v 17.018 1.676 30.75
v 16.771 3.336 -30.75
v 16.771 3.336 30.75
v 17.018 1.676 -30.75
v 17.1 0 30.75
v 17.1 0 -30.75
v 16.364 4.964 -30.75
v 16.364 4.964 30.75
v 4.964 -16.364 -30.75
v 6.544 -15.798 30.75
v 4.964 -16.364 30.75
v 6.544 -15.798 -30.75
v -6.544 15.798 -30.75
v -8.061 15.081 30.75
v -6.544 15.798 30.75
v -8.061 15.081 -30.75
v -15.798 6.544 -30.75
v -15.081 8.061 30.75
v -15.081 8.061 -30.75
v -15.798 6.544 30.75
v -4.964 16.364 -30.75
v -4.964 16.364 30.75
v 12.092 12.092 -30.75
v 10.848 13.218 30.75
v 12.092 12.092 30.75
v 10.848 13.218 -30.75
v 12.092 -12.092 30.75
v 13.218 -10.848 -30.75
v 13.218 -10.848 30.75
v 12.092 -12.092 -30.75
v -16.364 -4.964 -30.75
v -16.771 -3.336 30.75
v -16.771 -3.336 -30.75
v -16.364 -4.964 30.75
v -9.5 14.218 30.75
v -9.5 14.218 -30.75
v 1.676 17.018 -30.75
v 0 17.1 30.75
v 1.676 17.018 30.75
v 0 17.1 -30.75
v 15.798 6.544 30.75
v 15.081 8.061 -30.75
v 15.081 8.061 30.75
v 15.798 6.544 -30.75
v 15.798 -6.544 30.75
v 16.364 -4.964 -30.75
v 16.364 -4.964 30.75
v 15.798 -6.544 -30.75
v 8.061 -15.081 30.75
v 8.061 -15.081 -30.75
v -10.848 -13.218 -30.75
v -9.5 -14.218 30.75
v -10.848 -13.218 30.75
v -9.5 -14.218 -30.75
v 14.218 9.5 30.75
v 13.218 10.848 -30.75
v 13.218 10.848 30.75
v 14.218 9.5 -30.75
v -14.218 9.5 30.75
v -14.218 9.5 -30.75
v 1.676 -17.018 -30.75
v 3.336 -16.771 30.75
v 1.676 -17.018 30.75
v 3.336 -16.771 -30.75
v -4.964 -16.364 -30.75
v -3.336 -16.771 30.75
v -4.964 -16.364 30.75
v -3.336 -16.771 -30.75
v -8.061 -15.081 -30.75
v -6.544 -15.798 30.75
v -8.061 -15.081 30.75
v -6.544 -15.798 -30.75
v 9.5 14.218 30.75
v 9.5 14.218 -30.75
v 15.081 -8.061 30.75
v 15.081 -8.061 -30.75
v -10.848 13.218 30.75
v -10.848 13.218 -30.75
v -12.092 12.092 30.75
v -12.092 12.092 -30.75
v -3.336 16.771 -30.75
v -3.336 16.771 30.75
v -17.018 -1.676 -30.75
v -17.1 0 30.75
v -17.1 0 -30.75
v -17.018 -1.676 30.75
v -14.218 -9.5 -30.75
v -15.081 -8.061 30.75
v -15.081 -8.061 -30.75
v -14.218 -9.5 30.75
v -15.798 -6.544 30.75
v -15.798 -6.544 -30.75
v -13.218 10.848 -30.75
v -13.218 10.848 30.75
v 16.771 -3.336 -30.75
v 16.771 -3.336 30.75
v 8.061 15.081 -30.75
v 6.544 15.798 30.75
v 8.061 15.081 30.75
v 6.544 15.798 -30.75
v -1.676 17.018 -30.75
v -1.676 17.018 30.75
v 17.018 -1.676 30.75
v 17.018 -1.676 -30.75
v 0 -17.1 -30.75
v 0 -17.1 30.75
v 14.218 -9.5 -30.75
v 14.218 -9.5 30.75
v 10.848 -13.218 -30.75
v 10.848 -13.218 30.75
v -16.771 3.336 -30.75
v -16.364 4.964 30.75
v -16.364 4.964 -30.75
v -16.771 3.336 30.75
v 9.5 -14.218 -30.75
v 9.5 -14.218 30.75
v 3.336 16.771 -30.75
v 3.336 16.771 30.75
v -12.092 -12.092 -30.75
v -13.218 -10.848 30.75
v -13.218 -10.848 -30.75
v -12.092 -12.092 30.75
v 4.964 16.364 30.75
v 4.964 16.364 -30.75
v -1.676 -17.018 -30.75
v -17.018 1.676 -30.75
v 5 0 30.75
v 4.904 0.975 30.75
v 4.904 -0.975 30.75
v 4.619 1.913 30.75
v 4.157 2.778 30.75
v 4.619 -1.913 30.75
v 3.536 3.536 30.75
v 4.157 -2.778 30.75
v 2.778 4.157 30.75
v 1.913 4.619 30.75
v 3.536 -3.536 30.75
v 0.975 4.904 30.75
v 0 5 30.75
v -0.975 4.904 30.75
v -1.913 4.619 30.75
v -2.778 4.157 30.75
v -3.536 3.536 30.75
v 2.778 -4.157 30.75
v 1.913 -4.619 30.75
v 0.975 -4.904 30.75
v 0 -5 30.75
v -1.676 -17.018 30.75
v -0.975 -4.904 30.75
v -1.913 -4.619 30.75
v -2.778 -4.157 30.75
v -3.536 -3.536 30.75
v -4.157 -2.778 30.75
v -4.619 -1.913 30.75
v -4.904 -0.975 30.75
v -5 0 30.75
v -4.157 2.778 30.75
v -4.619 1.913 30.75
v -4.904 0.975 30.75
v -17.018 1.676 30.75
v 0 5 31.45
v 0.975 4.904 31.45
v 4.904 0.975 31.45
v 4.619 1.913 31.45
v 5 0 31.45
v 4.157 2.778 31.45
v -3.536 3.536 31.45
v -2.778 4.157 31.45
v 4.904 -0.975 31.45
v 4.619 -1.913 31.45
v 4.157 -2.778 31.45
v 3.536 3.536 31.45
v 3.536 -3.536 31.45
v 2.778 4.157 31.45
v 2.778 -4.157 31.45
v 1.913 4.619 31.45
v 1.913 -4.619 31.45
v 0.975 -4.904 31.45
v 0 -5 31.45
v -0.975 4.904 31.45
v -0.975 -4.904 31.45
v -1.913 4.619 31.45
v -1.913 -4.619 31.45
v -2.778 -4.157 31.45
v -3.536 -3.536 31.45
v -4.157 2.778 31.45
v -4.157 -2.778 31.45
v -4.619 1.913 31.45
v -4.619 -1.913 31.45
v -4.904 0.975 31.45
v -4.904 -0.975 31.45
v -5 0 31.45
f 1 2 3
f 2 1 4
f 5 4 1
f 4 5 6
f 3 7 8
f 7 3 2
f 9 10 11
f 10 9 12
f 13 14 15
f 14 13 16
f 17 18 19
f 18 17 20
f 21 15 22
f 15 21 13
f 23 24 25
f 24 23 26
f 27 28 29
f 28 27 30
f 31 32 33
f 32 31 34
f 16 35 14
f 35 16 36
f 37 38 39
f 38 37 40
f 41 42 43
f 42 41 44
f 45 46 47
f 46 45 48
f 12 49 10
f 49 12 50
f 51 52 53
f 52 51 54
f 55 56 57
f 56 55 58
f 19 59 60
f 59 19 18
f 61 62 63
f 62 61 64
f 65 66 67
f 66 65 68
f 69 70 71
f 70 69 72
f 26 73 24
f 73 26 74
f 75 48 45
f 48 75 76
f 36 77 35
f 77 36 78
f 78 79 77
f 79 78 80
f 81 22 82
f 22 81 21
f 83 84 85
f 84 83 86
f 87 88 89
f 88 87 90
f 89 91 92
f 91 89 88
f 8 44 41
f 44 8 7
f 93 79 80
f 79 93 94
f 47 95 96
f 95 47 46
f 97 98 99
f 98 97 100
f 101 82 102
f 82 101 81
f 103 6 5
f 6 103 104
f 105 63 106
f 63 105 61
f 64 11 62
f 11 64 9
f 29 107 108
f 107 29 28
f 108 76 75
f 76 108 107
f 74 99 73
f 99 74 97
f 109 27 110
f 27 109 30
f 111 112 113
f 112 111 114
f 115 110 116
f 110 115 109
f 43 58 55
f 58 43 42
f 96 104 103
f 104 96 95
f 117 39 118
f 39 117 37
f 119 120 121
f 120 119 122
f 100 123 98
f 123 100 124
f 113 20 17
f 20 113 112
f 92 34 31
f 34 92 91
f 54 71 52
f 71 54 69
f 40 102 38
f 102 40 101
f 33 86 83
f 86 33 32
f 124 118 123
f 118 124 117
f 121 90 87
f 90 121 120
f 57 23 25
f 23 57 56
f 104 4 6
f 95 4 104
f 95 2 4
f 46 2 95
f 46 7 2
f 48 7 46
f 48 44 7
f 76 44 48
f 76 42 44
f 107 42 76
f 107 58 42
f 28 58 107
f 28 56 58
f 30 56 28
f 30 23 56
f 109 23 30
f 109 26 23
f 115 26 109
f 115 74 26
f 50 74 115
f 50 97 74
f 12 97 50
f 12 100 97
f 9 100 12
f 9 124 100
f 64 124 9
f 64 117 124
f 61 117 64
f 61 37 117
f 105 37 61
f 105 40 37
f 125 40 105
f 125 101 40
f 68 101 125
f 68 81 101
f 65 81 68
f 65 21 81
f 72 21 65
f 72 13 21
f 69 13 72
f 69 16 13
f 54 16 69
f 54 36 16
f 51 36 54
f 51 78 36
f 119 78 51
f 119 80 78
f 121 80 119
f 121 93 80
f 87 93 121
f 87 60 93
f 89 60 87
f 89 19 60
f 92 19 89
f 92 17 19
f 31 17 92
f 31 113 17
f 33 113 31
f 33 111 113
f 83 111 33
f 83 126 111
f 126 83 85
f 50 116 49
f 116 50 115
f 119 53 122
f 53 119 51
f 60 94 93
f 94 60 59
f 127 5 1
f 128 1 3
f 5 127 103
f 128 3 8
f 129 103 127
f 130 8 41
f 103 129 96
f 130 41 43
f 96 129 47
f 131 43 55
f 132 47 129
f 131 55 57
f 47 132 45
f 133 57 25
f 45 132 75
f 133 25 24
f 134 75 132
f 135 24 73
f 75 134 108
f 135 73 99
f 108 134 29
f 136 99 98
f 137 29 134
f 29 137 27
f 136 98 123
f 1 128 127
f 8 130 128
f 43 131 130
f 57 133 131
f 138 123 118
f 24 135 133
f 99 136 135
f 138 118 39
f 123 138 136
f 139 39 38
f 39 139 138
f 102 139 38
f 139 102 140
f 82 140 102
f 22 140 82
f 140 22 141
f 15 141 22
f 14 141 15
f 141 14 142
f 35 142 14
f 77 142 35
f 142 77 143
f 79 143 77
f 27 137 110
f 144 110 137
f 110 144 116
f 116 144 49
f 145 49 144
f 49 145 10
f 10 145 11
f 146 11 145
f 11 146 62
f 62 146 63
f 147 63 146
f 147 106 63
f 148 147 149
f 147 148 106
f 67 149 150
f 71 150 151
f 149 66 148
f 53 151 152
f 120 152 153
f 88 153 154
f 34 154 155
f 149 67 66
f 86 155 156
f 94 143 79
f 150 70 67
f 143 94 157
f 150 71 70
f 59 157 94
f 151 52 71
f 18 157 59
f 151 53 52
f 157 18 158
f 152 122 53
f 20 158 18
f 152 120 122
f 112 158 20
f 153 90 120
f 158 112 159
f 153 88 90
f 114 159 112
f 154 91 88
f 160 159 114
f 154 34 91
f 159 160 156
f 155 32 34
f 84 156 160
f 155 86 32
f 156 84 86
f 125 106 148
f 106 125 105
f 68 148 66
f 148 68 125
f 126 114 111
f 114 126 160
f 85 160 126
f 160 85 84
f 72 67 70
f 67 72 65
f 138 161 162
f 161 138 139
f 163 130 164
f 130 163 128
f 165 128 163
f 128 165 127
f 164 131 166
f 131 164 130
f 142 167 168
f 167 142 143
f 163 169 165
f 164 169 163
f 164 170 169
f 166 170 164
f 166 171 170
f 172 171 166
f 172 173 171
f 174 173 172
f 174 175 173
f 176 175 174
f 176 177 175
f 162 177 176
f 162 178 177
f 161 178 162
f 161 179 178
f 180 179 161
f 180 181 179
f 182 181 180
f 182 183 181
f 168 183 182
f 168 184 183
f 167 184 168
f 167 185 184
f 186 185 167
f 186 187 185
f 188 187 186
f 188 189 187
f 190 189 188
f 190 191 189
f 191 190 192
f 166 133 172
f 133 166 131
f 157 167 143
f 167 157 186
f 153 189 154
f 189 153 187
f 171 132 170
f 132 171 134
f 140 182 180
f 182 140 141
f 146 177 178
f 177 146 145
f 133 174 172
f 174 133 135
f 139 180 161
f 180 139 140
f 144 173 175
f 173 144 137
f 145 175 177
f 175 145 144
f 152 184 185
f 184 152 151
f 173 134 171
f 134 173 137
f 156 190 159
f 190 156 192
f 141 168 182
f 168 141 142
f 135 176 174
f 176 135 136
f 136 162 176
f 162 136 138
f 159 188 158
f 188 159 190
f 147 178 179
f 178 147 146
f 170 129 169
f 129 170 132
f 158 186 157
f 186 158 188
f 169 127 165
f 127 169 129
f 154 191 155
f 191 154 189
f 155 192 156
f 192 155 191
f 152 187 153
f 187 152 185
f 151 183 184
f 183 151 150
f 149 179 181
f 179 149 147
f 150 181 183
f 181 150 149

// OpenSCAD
// Parameters
height_mm = 61.5; //[30.75:123:0.1]
diameter_mm = 34.2; //[17.1:68.4:0.1]
positive_terminal_diameter_mm = 10; //[5:20:0.1]
positive_terminal_height_mm = 1.5; //[0.75:3:0.1]
negative_terminal_diameter_mm = 12; //[6:24:0.1]
negative_terminal_height_mm = 0.3; //[0.15:0.6:0.05]
terminal_overlap_mm = 0.8; //[0.5:2:0.1]

// Battery - complete geometry
module battery() {
  union() {
    // Main body
    color("DimGray") {
      translate([0, 0, 0])
        cylinder(h=height_mm, r=diameter_mm/2, center=true, $fn=64);
    }
    // Positive terminal
    color("Silver") {
      translate([0, 0, height_mm/2 + positive_terminal_height_mm/2 - terminal_overlap_mm])
        cylinder(h=positive_terminal_height_mm, r=positive_terminal_diameter_mm/2, center=true, $fn=32);
    }
    // Negative terminal
    color("Silver") {
      translate([0, 0, -height_mm/2 - negative_terminal_height_mm/2 + terminal_overlap_mm])
        cylinder(h=negative_terminal_height_mm, r=negative_terminal_diameter_mm/2, center=true, $fn=32);
    }
  }
}

// Assembly
module assembly() {
  battery();
}

assembly();
